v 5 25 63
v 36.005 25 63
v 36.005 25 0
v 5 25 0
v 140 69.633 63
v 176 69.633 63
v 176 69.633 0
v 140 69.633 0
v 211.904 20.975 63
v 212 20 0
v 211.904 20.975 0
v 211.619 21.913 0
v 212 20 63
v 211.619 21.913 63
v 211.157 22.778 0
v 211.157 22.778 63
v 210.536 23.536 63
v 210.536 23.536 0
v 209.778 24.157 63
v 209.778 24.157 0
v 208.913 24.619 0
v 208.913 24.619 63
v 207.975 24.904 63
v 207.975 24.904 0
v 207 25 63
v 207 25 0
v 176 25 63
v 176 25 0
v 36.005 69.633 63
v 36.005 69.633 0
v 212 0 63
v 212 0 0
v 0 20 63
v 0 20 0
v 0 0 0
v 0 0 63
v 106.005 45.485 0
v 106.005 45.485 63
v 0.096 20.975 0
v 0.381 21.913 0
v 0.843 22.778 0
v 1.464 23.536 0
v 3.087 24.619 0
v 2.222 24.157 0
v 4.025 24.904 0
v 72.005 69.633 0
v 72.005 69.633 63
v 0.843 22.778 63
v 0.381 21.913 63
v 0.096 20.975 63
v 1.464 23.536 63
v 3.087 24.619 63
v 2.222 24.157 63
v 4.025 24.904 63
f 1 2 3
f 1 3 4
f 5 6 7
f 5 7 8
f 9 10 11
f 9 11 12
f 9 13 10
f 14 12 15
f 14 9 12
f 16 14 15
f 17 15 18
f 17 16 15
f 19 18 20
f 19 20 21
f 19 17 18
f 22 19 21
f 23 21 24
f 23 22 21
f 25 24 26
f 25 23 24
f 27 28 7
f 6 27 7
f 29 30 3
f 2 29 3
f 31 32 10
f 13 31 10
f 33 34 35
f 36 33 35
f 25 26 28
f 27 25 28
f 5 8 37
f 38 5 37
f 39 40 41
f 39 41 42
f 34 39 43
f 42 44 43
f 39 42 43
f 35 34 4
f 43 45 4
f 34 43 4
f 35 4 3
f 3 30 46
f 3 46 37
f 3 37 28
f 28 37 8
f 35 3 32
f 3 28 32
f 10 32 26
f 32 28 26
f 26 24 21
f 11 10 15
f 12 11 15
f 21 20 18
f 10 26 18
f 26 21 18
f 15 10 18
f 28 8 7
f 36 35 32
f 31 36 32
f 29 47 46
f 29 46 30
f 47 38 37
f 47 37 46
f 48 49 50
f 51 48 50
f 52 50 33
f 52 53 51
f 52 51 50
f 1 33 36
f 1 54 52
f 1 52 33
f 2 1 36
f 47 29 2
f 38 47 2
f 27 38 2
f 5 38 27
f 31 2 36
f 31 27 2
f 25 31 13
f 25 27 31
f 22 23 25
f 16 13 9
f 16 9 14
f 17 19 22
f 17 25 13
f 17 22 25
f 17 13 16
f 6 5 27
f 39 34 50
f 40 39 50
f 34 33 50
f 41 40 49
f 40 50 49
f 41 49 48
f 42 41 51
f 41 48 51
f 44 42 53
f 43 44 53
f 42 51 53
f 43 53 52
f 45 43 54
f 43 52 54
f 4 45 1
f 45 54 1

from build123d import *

# Parameters (mm, degrees)
BOSS_EXTRUDE1_DEPTH = 63
FILLET1_R           = 5
FILLET2_R           = 5


with BuildPart() as part:
    # Sketch1 → Boss-Extrude1 (new body)
    with BuildSketch(Plane.XY):
        Polygon((0, 0), (212, 0), (212, 25), (176, 25), (176, 69.632533644), (140, 69.632533644), (106.004578334, 45.485327779), (72.004578334, 69.632533644), (36.004578334, 69.632533644), (36.004578334, 25), (0, 25), align=None)
    extrude(amount=BOSS_EXTRUDE1_DEPTH)

    # Fillet1
    fillet1_edges = [part.edges().sort_by_distance(p)[0] for p in [
        (212, 25, 31.5),
    ]]
    fillet(fillet1_edges, radius=FILLET1_R)

    # Fillet2
    fillet2_edges = [part.edges().sort_by_distance(p)[0] for p in [
        (0, 25, 31.5),
    ]]
    fillet(fillet2_edges, radius=FILLET2_R)


solid = part.part
